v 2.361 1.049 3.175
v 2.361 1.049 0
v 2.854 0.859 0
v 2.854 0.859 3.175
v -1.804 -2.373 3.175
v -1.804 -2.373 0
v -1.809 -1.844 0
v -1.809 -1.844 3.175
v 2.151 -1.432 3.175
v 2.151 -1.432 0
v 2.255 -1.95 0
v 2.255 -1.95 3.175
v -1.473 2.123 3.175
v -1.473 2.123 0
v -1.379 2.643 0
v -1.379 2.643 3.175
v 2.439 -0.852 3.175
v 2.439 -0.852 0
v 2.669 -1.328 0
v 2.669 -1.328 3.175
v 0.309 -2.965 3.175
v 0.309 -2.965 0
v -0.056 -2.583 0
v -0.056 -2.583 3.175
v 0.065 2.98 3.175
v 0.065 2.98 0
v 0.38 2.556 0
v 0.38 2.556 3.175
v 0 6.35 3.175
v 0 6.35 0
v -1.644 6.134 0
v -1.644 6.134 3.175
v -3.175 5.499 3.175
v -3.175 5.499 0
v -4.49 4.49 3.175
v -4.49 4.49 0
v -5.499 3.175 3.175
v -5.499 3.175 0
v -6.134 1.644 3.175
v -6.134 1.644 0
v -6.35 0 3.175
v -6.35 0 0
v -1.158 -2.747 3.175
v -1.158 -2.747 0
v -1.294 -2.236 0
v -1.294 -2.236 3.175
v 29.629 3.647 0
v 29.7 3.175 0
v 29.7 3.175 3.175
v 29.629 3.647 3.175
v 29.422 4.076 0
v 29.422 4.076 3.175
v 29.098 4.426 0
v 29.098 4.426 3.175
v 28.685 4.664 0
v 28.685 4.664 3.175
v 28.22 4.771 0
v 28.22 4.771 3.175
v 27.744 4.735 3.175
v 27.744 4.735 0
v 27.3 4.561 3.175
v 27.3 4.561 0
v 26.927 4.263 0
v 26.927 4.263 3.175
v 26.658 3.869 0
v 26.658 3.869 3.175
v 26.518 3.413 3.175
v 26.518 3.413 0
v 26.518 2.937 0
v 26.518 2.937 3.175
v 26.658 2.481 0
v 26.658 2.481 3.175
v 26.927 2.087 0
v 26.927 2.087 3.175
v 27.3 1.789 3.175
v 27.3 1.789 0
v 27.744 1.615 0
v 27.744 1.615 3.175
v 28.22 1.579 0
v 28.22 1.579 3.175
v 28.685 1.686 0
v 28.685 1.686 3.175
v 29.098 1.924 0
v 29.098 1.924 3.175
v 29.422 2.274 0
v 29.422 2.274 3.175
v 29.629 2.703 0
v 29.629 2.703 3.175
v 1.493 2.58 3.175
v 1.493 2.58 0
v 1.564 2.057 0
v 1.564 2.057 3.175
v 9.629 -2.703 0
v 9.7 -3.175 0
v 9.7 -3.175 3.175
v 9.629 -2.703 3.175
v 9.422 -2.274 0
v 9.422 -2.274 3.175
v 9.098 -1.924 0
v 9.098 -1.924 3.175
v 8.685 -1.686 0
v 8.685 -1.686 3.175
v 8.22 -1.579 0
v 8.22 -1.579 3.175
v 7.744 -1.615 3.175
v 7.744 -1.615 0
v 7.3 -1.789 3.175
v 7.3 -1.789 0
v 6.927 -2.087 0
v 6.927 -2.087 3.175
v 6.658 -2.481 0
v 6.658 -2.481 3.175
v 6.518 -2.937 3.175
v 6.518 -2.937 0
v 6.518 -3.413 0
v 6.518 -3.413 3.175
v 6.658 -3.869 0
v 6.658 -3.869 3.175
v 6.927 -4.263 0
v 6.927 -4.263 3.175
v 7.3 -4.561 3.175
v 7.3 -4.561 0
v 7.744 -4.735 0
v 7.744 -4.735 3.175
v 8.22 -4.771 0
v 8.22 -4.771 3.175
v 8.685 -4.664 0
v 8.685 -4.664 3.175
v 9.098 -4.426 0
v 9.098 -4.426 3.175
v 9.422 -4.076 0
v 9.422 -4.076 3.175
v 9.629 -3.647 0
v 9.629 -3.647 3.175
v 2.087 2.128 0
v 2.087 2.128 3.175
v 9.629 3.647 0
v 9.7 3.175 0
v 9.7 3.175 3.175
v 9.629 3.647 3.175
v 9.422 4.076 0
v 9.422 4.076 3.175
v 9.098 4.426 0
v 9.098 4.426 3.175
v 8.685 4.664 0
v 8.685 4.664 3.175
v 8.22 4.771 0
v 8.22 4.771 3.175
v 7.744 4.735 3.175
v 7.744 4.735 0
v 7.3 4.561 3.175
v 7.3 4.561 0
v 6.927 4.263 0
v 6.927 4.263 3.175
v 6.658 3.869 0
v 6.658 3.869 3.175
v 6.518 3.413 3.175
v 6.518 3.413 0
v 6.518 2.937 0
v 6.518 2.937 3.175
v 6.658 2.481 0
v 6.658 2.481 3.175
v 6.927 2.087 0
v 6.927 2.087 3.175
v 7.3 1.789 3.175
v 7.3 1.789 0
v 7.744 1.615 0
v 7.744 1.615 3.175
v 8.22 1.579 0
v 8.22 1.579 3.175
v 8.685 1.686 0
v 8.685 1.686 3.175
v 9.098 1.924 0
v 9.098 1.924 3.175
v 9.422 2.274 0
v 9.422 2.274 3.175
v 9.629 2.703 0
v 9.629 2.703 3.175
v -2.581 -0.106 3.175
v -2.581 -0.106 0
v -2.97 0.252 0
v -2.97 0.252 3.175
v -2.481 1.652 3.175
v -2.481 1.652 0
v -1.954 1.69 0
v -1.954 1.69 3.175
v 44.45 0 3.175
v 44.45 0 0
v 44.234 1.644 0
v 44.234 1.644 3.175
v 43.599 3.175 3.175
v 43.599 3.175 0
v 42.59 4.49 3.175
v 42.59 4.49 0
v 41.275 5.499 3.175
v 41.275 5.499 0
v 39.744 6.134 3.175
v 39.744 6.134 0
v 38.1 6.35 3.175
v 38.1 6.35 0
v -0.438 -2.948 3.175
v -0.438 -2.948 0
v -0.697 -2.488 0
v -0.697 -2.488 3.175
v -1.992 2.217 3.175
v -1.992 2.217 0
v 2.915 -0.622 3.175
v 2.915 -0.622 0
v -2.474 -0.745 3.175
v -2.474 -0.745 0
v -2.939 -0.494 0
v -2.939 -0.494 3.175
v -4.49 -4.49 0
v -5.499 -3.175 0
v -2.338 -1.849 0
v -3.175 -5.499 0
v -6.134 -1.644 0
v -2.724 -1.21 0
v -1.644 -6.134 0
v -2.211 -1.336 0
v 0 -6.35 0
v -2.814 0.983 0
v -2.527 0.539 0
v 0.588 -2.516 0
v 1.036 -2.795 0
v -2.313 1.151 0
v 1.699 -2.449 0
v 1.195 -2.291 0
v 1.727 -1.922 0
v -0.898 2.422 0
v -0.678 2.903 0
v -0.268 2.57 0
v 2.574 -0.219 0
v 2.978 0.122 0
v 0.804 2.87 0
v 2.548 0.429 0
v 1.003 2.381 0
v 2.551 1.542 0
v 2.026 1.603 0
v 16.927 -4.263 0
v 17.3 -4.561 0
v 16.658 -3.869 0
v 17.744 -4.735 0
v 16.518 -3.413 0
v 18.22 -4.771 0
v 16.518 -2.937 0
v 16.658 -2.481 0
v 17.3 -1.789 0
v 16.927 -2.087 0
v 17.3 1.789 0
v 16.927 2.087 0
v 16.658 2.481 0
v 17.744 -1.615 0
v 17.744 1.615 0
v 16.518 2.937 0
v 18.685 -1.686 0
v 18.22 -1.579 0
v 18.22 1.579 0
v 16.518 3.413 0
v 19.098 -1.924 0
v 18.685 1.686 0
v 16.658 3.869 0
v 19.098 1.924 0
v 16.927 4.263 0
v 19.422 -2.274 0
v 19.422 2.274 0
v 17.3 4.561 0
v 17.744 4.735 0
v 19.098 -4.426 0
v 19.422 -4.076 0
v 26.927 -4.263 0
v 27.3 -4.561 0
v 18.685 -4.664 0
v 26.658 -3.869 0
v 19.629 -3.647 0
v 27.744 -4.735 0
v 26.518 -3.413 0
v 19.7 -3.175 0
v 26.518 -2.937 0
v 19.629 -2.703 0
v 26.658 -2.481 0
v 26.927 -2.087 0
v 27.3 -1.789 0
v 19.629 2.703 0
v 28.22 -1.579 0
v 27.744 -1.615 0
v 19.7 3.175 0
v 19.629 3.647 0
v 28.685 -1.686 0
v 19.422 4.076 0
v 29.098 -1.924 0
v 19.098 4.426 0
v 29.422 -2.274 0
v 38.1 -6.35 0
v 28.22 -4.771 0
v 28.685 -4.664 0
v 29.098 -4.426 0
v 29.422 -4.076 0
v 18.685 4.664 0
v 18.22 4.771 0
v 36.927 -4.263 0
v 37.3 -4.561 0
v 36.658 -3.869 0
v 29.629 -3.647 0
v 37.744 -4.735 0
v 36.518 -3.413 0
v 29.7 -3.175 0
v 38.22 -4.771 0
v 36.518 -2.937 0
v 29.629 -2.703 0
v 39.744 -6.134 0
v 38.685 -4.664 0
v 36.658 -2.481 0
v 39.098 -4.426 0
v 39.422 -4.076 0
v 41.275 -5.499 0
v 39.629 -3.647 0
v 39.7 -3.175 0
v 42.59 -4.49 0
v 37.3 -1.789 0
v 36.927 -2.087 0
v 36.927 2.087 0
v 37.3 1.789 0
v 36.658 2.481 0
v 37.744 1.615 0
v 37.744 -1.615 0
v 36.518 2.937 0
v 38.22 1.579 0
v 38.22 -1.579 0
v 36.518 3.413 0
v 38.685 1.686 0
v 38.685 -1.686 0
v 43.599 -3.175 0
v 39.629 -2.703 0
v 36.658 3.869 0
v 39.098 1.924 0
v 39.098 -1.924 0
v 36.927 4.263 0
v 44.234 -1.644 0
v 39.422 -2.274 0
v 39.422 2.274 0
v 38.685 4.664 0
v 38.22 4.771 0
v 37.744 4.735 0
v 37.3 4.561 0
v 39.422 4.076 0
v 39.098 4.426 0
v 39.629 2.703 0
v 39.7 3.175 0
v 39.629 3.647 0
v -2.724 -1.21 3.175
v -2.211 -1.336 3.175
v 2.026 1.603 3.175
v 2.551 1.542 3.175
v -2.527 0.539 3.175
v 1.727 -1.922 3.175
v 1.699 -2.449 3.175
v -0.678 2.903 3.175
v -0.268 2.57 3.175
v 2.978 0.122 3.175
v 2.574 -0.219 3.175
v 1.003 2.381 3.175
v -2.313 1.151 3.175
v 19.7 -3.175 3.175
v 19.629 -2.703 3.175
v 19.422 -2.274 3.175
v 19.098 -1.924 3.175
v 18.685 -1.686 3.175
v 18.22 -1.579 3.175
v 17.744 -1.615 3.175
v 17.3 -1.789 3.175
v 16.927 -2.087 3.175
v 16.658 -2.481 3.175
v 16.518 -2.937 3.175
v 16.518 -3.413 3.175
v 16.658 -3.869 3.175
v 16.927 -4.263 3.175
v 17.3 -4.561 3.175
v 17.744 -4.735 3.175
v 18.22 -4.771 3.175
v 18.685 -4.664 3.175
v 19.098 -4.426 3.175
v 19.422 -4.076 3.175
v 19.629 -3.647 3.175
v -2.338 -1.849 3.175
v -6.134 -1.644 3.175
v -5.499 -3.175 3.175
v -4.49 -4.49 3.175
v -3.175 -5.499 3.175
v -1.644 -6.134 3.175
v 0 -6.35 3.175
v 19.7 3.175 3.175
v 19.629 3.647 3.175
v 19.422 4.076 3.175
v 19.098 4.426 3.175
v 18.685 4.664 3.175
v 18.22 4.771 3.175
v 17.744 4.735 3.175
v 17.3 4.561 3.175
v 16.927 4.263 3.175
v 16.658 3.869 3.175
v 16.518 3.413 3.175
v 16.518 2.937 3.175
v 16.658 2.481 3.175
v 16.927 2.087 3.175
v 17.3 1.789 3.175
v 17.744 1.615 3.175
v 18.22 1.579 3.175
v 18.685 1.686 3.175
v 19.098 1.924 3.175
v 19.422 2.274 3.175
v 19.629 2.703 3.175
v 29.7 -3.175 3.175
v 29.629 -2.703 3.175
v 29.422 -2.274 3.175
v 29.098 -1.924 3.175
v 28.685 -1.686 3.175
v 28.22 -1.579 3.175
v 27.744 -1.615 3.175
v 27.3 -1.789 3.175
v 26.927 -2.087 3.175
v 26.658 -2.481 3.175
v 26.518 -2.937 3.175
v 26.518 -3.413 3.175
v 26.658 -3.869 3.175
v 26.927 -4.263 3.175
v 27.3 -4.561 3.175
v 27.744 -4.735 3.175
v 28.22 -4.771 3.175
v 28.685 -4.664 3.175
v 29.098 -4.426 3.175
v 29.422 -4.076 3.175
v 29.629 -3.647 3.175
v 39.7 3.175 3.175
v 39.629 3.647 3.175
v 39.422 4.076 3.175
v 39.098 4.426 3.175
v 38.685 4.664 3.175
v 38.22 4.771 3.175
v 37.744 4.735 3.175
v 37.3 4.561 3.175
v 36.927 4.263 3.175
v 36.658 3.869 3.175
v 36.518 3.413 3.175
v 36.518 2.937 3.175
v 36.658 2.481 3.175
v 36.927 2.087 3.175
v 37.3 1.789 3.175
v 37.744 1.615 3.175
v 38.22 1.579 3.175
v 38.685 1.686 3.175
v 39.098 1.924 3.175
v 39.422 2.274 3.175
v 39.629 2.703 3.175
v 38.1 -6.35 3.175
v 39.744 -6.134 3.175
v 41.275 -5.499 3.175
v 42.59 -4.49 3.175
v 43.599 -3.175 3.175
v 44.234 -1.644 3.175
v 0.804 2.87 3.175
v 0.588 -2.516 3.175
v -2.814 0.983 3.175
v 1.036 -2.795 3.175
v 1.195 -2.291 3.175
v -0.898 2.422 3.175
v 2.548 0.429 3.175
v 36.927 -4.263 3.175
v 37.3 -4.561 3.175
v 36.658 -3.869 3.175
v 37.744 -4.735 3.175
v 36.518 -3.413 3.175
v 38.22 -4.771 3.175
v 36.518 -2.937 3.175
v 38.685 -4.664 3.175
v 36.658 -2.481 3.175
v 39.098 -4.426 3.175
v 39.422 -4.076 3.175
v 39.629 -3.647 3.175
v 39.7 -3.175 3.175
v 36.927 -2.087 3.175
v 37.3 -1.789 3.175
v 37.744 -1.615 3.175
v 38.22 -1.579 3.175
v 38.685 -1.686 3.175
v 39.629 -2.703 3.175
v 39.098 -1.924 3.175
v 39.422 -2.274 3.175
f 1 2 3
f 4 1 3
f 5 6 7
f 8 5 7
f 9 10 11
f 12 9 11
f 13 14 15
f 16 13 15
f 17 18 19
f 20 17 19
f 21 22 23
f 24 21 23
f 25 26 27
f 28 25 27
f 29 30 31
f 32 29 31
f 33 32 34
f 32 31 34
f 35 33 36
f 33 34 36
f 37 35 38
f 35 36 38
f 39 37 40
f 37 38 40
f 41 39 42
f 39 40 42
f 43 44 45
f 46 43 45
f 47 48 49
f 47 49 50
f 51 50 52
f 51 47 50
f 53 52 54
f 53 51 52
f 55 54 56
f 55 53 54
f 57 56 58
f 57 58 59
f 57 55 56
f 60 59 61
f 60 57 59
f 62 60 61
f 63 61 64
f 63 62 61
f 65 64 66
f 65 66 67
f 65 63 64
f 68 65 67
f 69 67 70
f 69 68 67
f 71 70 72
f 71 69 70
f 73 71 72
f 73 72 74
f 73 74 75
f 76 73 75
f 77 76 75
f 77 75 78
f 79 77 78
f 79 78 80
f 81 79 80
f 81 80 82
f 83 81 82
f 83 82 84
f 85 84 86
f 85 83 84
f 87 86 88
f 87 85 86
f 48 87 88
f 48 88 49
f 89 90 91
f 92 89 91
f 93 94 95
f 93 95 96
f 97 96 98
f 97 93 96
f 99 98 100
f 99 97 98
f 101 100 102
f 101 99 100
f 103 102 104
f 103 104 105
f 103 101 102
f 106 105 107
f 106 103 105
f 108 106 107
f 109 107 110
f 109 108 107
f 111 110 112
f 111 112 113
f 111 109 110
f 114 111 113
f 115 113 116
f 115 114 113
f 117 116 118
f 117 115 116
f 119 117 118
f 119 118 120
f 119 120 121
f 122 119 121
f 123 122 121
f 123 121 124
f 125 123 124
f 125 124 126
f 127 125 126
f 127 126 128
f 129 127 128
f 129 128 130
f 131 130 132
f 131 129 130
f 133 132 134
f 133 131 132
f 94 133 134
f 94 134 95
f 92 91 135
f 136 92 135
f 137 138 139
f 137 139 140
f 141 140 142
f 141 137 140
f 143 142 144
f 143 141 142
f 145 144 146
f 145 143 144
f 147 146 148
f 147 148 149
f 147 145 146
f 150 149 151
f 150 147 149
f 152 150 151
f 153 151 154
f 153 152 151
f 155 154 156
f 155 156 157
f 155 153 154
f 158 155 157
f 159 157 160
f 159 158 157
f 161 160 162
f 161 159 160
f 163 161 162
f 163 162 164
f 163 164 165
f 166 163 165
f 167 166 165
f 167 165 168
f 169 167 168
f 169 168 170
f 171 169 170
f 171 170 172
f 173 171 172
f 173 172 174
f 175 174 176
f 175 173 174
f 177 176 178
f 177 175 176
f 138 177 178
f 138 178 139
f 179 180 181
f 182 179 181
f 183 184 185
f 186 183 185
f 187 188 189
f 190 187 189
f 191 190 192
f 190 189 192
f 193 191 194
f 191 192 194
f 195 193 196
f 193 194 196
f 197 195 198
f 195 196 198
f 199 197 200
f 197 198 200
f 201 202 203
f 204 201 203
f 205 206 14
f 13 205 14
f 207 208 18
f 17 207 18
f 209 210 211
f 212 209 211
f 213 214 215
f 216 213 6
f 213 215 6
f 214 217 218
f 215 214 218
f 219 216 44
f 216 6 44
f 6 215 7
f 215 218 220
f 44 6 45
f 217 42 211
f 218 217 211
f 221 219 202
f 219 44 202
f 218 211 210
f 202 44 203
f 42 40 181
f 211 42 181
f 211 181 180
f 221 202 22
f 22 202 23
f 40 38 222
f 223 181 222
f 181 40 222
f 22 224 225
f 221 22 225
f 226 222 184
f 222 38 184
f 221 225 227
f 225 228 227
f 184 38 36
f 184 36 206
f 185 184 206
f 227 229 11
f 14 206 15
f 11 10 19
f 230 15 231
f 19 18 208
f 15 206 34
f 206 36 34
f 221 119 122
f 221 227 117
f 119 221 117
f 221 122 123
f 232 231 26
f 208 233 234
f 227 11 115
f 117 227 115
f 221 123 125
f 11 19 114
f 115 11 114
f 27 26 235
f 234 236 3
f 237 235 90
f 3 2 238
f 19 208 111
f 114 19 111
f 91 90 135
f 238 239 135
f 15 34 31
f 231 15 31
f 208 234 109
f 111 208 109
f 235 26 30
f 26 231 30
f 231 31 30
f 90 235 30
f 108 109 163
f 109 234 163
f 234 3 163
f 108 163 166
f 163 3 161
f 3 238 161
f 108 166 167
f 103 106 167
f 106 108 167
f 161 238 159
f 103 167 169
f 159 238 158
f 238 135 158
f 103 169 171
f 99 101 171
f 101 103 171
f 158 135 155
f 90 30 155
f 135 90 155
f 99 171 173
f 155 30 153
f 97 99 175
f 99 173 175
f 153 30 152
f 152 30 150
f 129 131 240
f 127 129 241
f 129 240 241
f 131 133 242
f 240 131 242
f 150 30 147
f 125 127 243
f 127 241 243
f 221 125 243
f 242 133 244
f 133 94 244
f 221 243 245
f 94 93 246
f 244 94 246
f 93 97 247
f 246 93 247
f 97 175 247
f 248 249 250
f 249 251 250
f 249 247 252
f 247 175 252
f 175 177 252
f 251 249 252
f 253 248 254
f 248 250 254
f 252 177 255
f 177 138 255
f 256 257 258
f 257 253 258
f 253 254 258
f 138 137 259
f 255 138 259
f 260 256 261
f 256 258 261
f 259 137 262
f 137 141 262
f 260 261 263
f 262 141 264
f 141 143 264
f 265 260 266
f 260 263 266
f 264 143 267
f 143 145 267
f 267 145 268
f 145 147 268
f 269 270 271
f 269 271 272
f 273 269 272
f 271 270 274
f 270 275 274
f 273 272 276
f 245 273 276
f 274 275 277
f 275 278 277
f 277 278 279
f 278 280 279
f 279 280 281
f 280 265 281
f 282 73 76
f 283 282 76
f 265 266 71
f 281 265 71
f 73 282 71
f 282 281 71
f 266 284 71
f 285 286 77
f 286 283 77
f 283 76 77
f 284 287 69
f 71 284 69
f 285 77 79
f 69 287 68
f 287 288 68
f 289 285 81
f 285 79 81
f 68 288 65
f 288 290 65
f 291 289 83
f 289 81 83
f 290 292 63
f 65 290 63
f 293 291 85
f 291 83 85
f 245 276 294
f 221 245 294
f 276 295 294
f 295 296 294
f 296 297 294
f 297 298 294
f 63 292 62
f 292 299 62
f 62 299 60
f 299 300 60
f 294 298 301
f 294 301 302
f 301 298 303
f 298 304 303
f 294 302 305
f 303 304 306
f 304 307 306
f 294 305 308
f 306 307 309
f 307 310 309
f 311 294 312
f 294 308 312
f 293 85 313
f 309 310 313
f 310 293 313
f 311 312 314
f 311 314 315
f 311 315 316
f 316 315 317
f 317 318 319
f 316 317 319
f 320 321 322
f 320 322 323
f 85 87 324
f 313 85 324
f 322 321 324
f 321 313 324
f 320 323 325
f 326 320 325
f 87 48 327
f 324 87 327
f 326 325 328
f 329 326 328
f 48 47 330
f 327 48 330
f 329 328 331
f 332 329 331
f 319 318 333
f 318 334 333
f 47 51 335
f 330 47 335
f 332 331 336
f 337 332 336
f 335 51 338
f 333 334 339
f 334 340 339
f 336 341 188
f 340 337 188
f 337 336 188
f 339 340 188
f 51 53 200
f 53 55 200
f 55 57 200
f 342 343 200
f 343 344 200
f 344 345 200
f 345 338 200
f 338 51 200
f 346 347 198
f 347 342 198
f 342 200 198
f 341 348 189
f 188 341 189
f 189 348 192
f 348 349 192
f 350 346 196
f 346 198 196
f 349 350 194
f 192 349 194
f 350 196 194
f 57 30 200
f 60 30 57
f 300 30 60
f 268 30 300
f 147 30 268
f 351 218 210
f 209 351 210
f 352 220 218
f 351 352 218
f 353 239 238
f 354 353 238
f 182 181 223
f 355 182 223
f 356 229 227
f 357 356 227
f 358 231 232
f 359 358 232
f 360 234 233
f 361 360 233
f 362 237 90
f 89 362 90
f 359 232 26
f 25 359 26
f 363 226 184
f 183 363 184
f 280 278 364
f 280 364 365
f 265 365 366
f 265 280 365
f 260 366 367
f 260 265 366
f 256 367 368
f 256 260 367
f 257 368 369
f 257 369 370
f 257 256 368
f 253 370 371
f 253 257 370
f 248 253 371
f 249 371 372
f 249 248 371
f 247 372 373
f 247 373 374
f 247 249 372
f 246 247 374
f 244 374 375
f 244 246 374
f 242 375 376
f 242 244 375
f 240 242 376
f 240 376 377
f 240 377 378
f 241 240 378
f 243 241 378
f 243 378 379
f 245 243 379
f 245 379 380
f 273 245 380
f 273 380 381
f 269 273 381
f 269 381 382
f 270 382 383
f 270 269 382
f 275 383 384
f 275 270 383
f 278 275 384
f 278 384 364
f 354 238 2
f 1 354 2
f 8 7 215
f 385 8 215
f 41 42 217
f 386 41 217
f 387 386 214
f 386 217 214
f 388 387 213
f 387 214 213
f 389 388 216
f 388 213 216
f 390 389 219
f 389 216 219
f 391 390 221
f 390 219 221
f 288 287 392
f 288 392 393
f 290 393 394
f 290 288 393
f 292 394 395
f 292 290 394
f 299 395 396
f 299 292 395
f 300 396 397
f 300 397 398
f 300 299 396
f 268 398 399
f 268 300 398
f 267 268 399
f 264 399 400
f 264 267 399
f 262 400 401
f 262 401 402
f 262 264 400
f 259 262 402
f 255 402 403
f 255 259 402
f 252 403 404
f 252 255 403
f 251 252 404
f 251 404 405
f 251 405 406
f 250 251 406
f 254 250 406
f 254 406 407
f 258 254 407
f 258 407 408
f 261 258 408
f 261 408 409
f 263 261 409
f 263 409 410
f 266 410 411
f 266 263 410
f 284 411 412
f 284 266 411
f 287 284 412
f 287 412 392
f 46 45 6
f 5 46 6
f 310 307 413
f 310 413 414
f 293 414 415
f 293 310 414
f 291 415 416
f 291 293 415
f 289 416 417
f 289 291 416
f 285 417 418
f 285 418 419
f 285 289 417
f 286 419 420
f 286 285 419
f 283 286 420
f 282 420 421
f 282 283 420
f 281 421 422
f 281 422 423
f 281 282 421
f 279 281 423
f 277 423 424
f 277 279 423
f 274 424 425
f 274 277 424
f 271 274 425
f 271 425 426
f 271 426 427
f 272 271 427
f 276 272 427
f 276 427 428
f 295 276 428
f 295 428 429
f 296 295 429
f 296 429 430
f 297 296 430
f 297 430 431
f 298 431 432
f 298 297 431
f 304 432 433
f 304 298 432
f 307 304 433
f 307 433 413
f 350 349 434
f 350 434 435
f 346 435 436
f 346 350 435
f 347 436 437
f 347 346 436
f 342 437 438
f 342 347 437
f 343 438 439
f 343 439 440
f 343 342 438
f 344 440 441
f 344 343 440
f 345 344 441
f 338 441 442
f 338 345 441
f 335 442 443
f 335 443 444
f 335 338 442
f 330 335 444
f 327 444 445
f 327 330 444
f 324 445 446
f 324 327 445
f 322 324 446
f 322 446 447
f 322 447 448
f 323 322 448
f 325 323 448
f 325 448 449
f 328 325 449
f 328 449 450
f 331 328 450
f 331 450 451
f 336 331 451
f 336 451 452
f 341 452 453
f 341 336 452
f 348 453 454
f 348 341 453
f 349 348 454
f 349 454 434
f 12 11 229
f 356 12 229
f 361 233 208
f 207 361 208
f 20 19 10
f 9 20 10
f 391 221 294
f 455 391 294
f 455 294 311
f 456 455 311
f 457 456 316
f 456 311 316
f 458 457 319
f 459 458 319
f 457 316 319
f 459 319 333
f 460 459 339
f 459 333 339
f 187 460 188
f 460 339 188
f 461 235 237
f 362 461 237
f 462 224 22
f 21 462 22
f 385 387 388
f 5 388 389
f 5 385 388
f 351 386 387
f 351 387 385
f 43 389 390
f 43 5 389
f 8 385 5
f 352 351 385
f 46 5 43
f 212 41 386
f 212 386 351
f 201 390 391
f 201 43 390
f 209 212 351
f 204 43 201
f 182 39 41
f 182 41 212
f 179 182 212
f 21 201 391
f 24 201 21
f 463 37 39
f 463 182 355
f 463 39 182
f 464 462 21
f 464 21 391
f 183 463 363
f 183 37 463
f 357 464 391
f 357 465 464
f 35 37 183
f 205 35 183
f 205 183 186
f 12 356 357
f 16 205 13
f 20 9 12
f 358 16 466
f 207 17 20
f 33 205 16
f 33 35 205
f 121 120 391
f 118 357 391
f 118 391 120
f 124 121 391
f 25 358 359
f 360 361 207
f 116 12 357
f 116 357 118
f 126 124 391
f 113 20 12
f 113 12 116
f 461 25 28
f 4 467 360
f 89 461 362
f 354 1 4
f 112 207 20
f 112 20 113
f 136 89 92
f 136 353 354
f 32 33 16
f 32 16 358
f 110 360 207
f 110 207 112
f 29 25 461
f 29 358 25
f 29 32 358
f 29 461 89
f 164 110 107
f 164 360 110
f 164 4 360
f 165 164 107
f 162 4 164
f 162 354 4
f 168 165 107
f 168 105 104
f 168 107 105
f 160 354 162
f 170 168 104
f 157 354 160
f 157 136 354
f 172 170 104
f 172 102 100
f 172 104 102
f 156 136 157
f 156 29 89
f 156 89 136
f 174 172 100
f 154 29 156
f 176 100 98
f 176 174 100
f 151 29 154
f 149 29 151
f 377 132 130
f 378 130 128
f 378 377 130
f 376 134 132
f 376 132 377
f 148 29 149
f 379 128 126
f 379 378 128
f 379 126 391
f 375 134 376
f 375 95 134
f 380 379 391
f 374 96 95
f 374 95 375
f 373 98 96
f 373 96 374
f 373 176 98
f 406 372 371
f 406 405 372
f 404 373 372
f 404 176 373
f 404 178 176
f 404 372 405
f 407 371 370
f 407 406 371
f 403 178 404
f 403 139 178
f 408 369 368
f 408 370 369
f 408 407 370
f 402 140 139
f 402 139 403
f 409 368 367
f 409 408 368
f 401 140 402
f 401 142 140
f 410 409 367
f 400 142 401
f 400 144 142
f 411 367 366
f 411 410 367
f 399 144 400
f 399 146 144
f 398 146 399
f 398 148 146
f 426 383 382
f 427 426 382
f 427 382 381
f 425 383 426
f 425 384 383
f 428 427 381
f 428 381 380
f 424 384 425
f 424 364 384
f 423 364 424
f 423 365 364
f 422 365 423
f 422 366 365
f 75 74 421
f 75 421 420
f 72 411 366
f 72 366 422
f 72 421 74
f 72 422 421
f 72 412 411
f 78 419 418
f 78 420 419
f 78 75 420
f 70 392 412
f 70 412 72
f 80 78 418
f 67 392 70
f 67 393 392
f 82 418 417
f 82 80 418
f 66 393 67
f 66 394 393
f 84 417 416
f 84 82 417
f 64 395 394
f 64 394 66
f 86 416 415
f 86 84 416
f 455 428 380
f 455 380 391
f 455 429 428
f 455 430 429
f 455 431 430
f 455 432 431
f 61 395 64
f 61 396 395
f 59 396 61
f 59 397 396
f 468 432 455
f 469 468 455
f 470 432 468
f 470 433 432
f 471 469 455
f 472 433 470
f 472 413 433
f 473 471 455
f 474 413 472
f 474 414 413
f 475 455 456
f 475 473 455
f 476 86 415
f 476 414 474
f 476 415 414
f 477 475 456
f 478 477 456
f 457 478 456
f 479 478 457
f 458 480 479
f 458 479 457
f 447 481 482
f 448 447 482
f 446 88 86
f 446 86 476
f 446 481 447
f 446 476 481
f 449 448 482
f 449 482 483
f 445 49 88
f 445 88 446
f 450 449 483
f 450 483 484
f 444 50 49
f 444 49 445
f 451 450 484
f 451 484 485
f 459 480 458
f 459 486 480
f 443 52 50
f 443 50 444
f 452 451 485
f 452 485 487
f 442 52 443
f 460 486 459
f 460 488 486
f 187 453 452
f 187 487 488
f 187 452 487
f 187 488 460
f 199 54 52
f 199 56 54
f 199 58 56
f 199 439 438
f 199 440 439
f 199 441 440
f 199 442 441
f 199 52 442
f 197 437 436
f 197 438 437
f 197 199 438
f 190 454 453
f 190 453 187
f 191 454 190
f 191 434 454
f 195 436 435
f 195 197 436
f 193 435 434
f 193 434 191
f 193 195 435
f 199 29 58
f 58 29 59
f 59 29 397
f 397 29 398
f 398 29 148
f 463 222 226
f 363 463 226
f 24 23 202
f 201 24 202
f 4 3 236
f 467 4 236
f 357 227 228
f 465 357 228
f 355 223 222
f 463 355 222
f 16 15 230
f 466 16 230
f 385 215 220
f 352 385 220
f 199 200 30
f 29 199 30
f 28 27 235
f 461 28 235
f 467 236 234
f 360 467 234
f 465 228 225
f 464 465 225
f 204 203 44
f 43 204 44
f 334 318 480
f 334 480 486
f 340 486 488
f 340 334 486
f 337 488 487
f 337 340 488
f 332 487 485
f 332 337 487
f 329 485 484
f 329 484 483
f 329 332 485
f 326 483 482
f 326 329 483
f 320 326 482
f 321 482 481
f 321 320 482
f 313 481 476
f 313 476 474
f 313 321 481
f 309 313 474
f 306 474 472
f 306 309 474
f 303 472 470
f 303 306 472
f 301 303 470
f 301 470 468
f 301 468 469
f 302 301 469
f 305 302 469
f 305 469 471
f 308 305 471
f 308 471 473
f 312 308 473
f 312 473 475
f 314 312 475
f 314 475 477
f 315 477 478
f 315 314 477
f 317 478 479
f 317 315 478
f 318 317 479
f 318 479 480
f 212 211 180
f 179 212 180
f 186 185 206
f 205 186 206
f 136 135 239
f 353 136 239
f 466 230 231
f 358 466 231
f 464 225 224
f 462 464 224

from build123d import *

# Parameters (mm, degrees)
F0_R     = 1.6
F1_DEPTH = 3.175


with BuildPart() as f1:
    # F0 (on Top) → F1 (new body)
    with BuildSketch(Plane.XY):
        with BuildLine():
            Line((38.1, 6.35), (0, 6.35))
            ThreePointArc((0, 6.35), (-4.490128, 4.490128), (-6.35, 0))
            ThreePointArc((-6.35, 0), (-4.490128, -4.490128), (0, -6.35))
            Line((0, -6.35), (38.1, -6.35))
            ThreePointArc((38.1, -6.35), (42.590128, -4.490128), (44.45, 0))
            ThreePointArc((44.45, 0), (42.590128, 4.490128), (38.1, 6.35))
        make_face()
        with Locations((8.1, -3.175)):
            Circle(F0_R, mode=Mode.SUBTRACT)
        with Locations((18.1, -3.175)):
            Circle(F0_R, mode=Mode.SUBTRACT)
        with Locations((28.1, -3.175)):
            Circle(F0_R, mode=Mode.SUBTRACT)
        with Locations((38.1, -3.175)):
            Circle(F0_R, mode=Mode.SUBTRACT)
        Polygon((-2.313127, 1.150841), (-2.481189, 1.651718), (-1.954254, 1.689937), (-1.992473, 2.216873), (-1.472587, 2.122848), (-1.378562, 2.642733), (-0.898392, 2.422372), (-0.678031, 2.902541), (-0.267748, 2.56969), (0.065104, 2.979972), (0.37972, 2.555544), (0.804147, 2.87016), (1.003328, 2.380825), (1.492663, 2.580005), (1.563894, 2.056509), (2.08739, 2.12774), (2.026194, 1.602976), (2.550958, 1.54178), (2.361181, 1.048721), (2.85424, 0.858945), (2.547807, 0.428572), (2.97818, 0.122139), (2.574344, -0.218506), (2.914989, -0.622342), (2.439126, -0.851855), (2.668639, -1.327718), (2.150649, -1.431678), (2.254609, -1.949669), (1.727038, -1.921544), (1.698914, -2.449115), (1.194912, -2.290672), (1.036469, -2.794674), (0.587704, -2.515869), (0.308899, -2.964634), (-0.056431, -2.582985), (-0.43808, -2.948314), (-0.69702, -2.487802), (-1.157533, -2.746742), (-1.293813, -2.236301), (-1.804254, -2.372581), (-1.809311, -1.844285), (-2.337607, -1.849342), (-2.211123, -1.336386), (-2.724079, -1.209903), (-2.474002, -0.744517), (-2.939388, -0.494441), (-2.581431, -0.105868), (-2.970004, 0.252089), (-2.526659, 0.539434), (-2.814004, 0.982779), align=None, mode=Mode.SUBTRACT)
        with Locations((8.1, 3.175)):
            Circle(F0_R, mode=Mode.SUBTRACT)
        with Locations((18.1, 3.175)):
            Circle(F0_R, mode=Mode.SUBTRACT)
        with Locations((28.1, 3.175)):
            Circle(F0_R, mode=Mode.SUBTRACT)
        with Locations((38.1, 3.175)):
            Circle(F0_R, mode=Mode.SUBTRACT)
    extrude(amount=F1_DEPTH)


solid = f1.part
